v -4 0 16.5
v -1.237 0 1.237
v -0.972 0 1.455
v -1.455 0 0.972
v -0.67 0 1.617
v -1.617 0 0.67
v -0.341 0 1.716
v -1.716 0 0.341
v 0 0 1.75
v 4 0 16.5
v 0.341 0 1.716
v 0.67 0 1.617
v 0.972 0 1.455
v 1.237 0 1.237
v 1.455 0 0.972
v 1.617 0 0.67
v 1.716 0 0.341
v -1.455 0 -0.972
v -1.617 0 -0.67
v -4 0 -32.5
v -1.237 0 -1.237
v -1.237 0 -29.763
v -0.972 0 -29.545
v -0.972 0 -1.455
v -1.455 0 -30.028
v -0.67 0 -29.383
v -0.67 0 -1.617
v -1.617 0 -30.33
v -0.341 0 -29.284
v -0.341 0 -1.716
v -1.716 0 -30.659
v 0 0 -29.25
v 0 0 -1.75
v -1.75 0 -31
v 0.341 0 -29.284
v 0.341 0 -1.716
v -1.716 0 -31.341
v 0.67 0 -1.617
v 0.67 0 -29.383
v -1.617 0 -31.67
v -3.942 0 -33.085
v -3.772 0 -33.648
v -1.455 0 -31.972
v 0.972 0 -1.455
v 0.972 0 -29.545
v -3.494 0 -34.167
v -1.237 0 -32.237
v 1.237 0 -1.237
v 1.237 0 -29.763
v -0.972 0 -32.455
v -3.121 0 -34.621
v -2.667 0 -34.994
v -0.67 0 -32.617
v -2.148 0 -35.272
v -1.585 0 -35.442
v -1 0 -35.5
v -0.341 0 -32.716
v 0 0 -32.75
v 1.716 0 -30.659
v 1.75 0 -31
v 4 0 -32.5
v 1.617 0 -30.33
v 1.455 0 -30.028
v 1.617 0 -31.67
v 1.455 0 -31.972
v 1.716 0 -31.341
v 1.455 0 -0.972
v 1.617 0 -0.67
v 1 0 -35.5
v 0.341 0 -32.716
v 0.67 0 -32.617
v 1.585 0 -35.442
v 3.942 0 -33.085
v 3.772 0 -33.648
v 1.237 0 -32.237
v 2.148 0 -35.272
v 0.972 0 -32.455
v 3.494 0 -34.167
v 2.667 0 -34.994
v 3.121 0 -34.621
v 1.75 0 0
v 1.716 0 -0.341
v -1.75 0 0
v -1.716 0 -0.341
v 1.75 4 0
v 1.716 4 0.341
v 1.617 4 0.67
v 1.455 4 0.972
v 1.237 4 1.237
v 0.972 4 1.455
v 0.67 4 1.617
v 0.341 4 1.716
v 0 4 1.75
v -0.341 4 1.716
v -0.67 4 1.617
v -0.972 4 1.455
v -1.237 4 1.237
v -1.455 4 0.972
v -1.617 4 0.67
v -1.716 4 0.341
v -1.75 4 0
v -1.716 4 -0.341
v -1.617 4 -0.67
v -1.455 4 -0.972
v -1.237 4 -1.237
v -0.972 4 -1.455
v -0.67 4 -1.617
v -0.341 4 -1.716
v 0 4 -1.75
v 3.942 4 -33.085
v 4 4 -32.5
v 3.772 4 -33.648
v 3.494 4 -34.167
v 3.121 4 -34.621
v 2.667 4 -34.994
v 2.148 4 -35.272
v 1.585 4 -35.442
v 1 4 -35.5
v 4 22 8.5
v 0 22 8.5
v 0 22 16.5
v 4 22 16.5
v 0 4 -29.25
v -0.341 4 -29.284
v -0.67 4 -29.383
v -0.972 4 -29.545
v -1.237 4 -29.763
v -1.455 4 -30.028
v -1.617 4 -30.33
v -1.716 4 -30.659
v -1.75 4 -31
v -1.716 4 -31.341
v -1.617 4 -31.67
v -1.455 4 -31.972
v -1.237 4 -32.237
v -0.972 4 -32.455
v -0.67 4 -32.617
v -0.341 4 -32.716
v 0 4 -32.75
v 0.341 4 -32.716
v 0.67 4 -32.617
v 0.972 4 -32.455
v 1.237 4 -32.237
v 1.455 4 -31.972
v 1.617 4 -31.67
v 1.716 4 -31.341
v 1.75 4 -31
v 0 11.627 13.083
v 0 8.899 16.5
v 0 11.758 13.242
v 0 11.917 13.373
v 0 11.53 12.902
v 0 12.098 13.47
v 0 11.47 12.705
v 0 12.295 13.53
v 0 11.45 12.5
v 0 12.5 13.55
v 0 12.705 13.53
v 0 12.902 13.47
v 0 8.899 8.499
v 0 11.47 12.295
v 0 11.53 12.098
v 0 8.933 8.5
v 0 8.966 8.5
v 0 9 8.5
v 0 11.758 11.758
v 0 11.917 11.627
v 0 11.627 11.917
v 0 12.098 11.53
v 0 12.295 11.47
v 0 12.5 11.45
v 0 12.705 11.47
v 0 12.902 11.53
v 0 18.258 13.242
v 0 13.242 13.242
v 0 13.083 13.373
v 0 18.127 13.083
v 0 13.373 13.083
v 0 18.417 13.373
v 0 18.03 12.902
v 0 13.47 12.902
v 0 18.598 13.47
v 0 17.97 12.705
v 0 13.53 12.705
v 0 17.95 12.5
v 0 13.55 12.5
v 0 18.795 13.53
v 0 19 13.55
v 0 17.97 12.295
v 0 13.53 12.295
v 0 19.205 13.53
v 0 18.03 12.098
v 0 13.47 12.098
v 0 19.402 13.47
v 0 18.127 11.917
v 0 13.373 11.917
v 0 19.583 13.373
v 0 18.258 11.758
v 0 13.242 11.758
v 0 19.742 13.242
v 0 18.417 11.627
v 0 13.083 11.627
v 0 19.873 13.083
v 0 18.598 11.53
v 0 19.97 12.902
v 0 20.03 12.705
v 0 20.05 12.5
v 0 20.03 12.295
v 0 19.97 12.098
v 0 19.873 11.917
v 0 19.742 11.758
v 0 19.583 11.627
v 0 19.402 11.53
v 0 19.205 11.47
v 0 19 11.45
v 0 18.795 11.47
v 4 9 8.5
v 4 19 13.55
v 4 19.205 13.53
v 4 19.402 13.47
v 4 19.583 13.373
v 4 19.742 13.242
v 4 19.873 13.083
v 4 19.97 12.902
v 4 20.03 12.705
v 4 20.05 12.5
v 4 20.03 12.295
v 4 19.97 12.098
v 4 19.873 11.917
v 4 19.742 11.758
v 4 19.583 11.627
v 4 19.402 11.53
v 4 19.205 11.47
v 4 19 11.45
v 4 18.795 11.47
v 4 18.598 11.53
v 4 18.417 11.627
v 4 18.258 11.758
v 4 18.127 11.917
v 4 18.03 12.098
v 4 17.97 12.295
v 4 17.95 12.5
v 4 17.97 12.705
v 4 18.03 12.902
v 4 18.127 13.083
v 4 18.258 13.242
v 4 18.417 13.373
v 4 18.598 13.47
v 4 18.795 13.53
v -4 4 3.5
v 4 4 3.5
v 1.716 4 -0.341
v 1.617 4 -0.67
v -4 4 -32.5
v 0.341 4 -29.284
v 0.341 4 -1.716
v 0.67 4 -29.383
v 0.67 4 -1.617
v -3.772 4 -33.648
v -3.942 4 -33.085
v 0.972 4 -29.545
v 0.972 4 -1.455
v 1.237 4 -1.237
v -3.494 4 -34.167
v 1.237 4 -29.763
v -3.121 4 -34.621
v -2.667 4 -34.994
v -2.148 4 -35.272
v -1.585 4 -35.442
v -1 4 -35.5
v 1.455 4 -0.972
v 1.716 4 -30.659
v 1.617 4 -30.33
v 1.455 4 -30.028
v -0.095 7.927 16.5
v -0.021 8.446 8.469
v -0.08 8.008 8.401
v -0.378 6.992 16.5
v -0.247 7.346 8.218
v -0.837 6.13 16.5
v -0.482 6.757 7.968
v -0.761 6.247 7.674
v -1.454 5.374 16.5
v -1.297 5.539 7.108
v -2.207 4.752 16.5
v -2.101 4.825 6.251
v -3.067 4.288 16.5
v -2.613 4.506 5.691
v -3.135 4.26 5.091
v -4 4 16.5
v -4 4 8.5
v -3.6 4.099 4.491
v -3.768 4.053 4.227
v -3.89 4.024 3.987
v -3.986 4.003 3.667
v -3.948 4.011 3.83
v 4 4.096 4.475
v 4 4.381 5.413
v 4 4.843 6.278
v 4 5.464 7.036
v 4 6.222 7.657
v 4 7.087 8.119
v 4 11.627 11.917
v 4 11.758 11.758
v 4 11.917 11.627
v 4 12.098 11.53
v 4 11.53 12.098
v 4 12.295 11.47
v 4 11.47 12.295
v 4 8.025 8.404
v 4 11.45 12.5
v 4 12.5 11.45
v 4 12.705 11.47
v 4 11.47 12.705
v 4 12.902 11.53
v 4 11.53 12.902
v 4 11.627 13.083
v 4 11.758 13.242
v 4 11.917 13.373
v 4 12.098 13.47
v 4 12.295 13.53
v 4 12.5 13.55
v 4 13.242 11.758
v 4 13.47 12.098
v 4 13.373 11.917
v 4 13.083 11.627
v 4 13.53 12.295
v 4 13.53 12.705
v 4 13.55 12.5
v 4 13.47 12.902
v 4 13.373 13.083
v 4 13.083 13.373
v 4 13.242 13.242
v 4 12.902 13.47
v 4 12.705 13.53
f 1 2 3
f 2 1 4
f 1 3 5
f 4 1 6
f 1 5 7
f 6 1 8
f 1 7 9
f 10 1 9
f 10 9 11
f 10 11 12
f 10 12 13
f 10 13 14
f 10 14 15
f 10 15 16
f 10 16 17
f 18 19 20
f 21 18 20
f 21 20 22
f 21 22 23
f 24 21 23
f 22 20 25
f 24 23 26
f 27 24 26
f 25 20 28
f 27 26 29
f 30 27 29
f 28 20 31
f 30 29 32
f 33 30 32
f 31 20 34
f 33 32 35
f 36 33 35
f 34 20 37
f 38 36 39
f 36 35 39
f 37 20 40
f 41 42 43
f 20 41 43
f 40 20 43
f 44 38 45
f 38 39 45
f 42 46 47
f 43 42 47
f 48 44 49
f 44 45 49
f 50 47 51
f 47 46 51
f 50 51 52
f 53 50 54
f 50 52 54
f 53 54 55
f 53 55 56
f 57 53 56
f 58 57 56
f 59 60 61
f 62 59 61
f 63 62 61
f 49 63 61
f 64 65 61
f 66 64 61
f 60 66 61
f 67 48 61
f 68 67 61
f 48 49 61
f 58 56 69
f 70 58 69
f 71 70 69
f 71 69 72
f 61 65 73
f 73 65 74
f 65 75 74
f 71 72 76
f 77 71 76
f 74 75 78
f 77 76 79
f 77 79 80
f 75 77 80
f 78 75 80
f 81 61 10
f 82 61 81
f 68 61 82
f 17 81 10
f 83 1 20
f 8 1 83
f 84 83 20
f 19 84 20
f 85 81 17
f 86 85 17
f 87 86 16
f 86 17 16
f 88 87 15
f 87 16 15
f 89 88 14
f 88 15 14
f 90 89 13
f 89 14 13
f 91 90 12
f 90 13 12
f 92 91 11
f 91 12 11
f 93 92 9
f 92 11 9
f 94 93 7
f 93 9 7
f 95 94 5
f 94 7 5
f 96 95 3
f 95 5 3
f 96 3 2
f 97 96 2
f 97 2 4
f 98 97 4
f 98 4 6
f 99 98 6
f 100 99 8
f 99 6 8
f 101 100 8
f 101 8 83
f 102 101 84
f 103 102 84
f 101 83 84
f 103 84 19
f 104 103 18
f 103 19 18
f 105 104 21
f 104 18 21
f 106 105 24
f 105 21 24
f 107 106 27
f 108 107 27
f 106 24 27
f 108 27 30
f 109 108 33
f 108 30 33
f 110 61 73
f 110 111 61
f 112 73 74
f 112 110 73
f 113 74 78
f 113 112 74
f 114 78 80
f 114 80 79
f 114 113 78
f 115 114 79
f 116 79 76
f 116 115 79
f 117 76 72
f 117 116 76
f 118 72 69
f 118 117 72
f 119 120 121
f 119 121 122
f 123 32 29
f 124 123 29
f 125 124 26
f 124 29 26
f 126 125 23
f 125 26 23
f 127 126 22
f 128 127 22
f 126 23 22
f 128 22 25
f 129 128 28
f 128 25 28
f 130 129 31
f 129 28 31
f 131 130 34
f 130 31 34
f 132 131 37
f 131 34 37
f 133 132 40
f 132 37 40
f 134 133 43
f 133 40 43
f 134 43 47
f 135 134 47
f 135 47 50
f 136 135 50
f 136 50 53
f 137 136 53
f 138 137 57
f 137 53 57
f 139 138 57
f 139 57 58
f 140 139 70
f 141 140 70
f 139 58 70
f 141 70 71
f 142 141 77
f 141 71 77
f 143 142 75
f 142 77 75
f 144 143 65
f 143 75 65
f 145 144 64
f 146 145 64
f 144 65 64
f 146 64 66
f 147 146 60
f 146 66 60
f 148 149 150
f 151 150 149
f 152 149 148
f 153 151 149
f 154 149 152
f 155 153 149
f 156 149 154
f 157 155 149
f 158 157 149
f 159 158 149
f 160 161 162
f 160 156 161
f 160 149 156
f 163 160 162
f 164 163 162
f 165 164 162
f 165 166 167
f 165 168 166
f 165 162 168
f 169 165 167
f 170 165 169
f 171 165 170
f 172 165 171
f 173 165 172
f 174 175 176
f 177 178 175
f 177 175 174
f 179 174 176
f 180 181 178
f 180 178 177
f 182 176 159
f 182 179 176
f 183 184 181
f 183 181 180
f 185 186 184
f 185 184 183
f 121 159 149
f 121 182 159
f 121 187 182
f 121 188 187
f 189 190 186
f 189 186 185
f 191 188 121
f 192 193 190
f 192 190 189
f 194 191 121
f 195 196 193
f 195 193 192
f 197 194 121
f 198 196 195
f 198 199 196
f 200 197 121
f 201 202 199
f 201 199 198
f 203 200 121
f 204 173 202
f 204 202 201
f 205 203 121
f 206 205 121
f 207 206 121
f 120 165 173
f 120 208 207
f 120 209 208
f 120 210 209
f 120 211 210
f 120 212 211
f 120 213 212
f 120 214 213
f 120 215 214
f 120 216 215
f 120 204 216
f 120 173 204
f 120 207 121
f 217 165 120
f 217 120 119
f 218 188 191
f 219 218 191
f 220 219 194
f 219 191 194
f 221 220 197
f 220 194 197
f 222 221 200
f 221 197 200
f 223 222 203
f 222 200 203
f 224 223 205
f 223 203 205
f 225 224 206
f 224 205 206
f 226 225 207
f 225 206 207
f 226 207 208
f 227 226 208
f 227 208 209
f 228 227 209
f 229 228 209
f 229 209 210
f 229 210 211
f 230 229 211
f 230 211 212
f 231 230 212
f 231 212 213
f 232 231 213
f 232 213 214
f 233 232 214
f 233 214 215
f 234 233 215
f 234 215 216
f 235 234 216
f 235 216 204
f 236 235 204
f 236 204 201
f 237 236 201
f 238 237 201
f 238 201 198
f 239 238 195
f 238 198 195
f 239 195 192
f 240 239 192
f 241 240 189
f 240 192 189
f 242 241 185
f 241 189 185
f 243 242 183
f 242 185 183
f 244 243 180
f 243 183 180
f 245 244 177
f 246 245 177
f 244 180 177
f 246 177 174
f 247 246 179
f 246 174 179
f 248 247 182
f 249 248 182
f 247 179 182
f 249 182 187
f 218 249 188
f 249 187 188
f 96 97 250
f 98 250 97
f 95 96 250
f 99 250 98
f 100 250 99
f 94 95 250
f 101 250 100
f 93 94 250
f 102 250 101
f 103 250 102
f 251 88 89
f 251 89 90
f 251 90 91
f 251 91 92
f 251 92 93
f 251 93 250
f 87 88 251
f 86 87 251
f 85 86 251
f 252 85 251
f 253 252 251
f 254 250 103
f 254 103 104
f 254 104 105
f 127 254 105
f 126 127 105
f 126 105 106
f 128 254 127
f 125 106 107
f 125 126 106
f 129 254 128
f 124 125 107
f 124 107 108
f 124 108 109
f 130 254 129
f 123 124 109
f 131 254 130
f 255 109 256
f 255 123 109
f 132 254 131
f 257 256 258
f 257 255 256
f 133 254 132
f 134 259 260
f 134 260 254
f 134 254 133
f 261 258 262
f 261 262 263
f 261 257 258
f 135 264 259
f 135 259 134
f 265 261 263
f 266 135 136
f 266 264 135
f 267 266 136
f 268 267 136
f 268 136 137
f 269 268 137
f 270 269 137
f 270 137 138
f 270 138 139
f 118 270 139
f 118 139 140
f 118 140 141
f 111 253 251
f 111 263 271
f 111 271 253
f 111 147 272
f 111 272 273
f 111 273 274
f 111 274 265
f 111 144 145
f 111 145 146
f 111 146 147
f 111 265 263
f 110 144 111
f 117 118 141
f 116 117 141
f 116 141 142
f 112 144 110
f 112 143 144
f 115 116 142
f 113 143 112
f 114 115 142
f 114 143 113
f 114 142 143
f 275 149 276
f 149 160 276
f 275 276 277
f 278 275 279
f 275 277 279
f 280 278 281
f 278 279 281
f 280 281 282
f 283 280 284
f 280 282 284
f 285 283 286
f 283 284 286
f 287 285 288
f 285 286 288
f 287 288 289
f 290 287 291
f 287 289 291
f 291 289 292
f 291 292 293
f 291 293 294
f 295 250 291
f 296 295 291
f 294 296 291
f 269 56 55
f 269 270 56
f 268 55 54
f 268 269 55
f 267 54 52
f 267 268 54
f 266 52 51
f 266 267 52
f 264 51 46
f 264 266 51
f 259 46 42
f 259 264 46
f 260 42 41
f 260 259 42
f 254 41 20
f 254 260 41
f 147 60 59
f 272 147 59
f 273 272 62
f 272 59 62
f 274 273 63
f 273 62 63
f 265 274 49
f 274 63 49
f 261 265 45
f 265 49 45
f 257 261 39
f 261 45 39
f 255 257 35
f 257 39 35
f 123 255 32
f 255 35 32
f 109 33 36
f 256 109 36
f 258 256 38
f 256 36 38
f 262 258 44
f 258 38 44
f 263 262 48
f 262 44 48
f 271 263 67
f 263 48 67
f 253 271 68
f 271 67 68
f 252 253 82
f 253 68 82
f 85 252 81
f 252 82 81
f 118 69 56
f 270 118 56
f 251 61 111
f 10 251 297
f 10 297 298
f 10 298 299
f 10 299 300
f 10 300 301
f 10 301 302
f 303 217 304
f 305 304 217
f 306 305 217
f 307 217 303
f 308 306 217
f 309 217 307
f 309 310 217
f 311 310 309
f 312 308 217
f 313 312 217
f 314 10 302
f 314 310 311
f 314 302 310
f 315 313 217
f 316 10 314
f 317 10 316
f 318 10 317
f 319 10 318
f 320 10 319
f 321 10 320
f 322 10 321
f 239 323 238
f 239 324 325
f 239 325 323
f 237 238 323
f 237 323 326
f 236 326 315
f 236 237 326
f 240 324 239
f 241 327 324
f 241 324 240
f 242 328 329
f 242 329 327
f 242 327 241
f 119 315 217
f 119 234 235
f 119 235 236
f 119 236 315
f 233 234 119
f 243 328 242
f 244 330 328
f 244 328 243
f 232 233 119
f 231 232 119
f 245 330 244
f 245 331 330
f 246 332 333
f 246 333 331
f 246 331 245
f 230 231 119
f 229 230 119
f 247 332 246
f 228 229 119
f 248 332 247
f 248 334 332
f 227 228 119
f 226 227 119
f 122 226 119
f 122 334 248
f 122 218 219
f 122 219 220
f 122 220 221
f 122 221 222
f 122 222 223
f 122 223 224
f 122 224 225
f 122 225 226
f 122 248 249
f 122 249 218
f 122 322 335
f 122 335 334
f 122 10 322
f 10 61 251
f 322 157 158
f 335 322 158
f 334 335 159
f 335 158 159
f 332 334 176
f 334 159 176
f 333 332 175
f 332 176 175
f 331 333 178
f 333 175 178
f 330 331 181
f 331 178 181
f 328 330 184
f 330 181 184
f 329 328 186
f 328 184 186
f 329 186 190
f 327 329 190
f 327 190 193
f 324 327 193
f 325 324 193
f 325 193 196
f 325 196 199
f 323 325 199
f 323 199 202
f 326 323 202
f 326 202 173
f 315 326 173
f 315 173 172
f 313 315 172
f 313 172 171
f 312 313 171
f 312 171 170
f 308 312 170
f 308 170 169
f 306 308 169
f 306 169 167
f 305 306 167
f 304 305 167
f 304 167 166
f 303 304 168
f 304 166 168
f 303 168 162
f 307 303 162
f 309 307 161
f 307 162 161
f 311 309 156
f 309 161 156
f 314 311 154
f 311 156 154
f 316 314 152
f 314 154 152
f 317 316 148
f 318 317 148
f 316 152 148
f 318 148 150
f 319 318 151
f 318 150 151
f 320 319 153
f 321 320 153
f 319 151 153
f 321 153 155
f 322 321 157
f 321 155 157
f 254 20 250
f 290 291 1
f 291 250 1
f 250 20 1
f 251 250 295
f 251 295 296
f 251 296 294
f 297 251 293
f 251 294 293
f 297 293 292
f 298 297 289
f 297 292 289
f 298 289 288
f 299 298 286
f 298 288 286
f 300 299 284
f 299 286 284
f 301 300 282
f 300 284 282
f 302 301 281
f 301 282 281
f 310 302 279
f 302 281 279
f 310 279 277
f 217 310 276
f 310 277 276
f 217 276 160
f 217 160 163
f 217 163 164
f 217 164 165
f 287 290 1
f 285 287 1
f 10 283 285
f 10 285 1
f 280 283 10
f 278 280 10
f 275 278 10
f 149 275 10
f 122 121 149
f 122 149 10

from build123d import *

# Parameters (mm, degrees)
SKETCH1_W           = 4
SKETCH1_H           = 8
SKETCH1_H_2         = 4.5
BOSS_EXTRUDE1_DEPTH = 4
SKETCH1_3_W         = 4
SKETCH1_3_H         = 8
BOSS_EXTRUDE2_DEPTH = 22
SKETCH3_R           = 1.05
CUT_EXTRUDE2_DEPTH  = 15
FILLET1_START       = -0.04496
FILLET1_DEPTH       = 4.04496
FILLET1_START_2     = -4.000000861
FILLET1_2_DEPTH     = 3.955040861
FILLET1_START_3     = 2
FILLET1_3_DEPTH     = 6.5
FILLET1_START_4     = 8.5
FILLET1_4_DEPTH     = 8
FILLET2_R           = 3


with BuildPart() as part:
    # Sketch1 → Boss-Extrude1 (new body)
    # profile 1 of 3: a face of its own
    with BuildSketch(Plane(origin=(0, 0, 0), x_dir=(1, 0, 0), z_dir=(0, 1, 0))):
        with Locations((2, -12.5)):
            Rectangle(SKETCH1_W, SKETCH1_H)
    # profile 2 of 3: a face of its own
    with BuildSketch(Plane(origin=(0, 0, 0), x_dir=(1, 0, 0), z_dir=(0, 1, 0))):
        Polygon((-4, -16.5), (0, -16.5), (0, -8.5), (0, -4), (4, -4), (4, 35.5), (-4, 35.5), align=None)
        with BuildLine():
            ThreePointArc((1.75, 0), (-1.237436867, -1.237436867), (0, 1.75))
            ThreePointArc((0, 1.75), (1.237436867, 1.237436867), (1.75, 0))
        make_face(mode=Mode.SUBTRACT)
        with BuildLine():
            ThreePointArc((1.75, 31), (1.237436867, 29.762563133), (0, 29.25))
            ThreePointArc((0, 29.25), (-1.237436867, 32.237436867), (1.75, 31))
        make_face(mode=Mode.SUBTRACT)
    # profile 3 of 3: a face of its own
    with BuildSketch(Plane(origin=(0, 0, 0), x_dir=(1, 0, 0), z_dir=(0, 1, 0))):
        with Locations((2, -6.25)):
            Rectangle(SKETCH1_W, SKETCH1_H_2)
    extrude(amount=BOSS_EXTRUDE1_DEPTH)

    # Sketch1<3> → Boss-Extrude2 (add)
    with BuildSketch(Plane(origin=(0, 0, 0), x_dir=(1, 0, 0), z_dir=(0, 1, 0))):
        with Locations((2, -12.5)):
            Rectangle(SKETCH1_3_W, SKETCH1_3_H)
    extrude(amount=BOSS_EXTRUDE2_DEPTH)

    # Sketch3 → Cut-Extrude2 (cut)
    with BuildSketch(Plane.ZY):
        with Locations((12.5, 19)):
            Circle(SKETCH3_R)
        with Locations((12.5, 12.5)):
            Circle(SKETCH3_R)
    extrude(amount=-CUT_EXTRUDE2_DEPTH, mode=Mode.SUBTRACT)

    # Fillet1: read off the stored shape, not the designer's step
    # Fillet1 outline → Fillet1 (add)
    with BuildSketch(Plane.YZ.offset(FILLET1_START)):
        with BuildLine():
            ThreePointArc((4, 3.5), (5.464466094, 7.035533906), (9, 8.5))
            Line((9, 8.5), (4, 8.5))
            Line((4, 8.5), (4, 3.5))
        make_face()
    extrude(amount=FILLET1_DEPTH)

    # Fillet1 2 outline → Fillet1 2 (add)
    with BuildSketch(Plane.YZ.offset(FILLET1_START_2)):
        with BuildLine():
            ThreePointArc((4, 3.5), (5.464466094, 7.035533906), (9, 8.5))
            Line((9, 8.5), (4, 8.5))
            Line((4, 8.5), (4, 3.5))
        make_face()
    extrude(amount=FILLET1_2_DEPTH)

    # Fillet1 3 outline → Fillet1 3 (cut)
    with BuildSketch(Plane.XY.offset(FILLET1_START_3)):
        with BuildLine():
            Line((-4.000000861, 10), (-4.000045415, 3.99999073))
            ThreePointArc((-4.000045415, 3.99999073), (-1.127031311, 5.736683874), (0, 8.898979486))
            Line((0, 8.898979486), (0, 10))
            Line((0, 10), (-4.000000861, 10))
        make_face()
    extrude(amount=FILLET1_3_DEPTH, mode=Mode.SUBTRACT)

    # Fillet1 4 outline → Fillet1 4 (add)
    with BuildSketch(Plane.XY.offset(FILLET1_START_4)):
        with BuildLine():
            ThreePointArc((0, 8.898979486), (-1.127031311, 5.736683874), (-4.000045415, 3.99999073))
            Line((-4.000045415, 3.99999073), (0, 4))
            Line((0, 4), (0, 8.898979486))
        make_face()
    extrude(amount=FILLET1_4_DEPTH)

    # Fillet2
    fillet2_edges = [part.edges().sort_by_distance(p)[0] for p in [
        (-4, 2, -35.5),
        (4, 2, -35.5),
    ]]
    fillet(fillet2_edges, radius=FILLET2_R)


solid = part.part
